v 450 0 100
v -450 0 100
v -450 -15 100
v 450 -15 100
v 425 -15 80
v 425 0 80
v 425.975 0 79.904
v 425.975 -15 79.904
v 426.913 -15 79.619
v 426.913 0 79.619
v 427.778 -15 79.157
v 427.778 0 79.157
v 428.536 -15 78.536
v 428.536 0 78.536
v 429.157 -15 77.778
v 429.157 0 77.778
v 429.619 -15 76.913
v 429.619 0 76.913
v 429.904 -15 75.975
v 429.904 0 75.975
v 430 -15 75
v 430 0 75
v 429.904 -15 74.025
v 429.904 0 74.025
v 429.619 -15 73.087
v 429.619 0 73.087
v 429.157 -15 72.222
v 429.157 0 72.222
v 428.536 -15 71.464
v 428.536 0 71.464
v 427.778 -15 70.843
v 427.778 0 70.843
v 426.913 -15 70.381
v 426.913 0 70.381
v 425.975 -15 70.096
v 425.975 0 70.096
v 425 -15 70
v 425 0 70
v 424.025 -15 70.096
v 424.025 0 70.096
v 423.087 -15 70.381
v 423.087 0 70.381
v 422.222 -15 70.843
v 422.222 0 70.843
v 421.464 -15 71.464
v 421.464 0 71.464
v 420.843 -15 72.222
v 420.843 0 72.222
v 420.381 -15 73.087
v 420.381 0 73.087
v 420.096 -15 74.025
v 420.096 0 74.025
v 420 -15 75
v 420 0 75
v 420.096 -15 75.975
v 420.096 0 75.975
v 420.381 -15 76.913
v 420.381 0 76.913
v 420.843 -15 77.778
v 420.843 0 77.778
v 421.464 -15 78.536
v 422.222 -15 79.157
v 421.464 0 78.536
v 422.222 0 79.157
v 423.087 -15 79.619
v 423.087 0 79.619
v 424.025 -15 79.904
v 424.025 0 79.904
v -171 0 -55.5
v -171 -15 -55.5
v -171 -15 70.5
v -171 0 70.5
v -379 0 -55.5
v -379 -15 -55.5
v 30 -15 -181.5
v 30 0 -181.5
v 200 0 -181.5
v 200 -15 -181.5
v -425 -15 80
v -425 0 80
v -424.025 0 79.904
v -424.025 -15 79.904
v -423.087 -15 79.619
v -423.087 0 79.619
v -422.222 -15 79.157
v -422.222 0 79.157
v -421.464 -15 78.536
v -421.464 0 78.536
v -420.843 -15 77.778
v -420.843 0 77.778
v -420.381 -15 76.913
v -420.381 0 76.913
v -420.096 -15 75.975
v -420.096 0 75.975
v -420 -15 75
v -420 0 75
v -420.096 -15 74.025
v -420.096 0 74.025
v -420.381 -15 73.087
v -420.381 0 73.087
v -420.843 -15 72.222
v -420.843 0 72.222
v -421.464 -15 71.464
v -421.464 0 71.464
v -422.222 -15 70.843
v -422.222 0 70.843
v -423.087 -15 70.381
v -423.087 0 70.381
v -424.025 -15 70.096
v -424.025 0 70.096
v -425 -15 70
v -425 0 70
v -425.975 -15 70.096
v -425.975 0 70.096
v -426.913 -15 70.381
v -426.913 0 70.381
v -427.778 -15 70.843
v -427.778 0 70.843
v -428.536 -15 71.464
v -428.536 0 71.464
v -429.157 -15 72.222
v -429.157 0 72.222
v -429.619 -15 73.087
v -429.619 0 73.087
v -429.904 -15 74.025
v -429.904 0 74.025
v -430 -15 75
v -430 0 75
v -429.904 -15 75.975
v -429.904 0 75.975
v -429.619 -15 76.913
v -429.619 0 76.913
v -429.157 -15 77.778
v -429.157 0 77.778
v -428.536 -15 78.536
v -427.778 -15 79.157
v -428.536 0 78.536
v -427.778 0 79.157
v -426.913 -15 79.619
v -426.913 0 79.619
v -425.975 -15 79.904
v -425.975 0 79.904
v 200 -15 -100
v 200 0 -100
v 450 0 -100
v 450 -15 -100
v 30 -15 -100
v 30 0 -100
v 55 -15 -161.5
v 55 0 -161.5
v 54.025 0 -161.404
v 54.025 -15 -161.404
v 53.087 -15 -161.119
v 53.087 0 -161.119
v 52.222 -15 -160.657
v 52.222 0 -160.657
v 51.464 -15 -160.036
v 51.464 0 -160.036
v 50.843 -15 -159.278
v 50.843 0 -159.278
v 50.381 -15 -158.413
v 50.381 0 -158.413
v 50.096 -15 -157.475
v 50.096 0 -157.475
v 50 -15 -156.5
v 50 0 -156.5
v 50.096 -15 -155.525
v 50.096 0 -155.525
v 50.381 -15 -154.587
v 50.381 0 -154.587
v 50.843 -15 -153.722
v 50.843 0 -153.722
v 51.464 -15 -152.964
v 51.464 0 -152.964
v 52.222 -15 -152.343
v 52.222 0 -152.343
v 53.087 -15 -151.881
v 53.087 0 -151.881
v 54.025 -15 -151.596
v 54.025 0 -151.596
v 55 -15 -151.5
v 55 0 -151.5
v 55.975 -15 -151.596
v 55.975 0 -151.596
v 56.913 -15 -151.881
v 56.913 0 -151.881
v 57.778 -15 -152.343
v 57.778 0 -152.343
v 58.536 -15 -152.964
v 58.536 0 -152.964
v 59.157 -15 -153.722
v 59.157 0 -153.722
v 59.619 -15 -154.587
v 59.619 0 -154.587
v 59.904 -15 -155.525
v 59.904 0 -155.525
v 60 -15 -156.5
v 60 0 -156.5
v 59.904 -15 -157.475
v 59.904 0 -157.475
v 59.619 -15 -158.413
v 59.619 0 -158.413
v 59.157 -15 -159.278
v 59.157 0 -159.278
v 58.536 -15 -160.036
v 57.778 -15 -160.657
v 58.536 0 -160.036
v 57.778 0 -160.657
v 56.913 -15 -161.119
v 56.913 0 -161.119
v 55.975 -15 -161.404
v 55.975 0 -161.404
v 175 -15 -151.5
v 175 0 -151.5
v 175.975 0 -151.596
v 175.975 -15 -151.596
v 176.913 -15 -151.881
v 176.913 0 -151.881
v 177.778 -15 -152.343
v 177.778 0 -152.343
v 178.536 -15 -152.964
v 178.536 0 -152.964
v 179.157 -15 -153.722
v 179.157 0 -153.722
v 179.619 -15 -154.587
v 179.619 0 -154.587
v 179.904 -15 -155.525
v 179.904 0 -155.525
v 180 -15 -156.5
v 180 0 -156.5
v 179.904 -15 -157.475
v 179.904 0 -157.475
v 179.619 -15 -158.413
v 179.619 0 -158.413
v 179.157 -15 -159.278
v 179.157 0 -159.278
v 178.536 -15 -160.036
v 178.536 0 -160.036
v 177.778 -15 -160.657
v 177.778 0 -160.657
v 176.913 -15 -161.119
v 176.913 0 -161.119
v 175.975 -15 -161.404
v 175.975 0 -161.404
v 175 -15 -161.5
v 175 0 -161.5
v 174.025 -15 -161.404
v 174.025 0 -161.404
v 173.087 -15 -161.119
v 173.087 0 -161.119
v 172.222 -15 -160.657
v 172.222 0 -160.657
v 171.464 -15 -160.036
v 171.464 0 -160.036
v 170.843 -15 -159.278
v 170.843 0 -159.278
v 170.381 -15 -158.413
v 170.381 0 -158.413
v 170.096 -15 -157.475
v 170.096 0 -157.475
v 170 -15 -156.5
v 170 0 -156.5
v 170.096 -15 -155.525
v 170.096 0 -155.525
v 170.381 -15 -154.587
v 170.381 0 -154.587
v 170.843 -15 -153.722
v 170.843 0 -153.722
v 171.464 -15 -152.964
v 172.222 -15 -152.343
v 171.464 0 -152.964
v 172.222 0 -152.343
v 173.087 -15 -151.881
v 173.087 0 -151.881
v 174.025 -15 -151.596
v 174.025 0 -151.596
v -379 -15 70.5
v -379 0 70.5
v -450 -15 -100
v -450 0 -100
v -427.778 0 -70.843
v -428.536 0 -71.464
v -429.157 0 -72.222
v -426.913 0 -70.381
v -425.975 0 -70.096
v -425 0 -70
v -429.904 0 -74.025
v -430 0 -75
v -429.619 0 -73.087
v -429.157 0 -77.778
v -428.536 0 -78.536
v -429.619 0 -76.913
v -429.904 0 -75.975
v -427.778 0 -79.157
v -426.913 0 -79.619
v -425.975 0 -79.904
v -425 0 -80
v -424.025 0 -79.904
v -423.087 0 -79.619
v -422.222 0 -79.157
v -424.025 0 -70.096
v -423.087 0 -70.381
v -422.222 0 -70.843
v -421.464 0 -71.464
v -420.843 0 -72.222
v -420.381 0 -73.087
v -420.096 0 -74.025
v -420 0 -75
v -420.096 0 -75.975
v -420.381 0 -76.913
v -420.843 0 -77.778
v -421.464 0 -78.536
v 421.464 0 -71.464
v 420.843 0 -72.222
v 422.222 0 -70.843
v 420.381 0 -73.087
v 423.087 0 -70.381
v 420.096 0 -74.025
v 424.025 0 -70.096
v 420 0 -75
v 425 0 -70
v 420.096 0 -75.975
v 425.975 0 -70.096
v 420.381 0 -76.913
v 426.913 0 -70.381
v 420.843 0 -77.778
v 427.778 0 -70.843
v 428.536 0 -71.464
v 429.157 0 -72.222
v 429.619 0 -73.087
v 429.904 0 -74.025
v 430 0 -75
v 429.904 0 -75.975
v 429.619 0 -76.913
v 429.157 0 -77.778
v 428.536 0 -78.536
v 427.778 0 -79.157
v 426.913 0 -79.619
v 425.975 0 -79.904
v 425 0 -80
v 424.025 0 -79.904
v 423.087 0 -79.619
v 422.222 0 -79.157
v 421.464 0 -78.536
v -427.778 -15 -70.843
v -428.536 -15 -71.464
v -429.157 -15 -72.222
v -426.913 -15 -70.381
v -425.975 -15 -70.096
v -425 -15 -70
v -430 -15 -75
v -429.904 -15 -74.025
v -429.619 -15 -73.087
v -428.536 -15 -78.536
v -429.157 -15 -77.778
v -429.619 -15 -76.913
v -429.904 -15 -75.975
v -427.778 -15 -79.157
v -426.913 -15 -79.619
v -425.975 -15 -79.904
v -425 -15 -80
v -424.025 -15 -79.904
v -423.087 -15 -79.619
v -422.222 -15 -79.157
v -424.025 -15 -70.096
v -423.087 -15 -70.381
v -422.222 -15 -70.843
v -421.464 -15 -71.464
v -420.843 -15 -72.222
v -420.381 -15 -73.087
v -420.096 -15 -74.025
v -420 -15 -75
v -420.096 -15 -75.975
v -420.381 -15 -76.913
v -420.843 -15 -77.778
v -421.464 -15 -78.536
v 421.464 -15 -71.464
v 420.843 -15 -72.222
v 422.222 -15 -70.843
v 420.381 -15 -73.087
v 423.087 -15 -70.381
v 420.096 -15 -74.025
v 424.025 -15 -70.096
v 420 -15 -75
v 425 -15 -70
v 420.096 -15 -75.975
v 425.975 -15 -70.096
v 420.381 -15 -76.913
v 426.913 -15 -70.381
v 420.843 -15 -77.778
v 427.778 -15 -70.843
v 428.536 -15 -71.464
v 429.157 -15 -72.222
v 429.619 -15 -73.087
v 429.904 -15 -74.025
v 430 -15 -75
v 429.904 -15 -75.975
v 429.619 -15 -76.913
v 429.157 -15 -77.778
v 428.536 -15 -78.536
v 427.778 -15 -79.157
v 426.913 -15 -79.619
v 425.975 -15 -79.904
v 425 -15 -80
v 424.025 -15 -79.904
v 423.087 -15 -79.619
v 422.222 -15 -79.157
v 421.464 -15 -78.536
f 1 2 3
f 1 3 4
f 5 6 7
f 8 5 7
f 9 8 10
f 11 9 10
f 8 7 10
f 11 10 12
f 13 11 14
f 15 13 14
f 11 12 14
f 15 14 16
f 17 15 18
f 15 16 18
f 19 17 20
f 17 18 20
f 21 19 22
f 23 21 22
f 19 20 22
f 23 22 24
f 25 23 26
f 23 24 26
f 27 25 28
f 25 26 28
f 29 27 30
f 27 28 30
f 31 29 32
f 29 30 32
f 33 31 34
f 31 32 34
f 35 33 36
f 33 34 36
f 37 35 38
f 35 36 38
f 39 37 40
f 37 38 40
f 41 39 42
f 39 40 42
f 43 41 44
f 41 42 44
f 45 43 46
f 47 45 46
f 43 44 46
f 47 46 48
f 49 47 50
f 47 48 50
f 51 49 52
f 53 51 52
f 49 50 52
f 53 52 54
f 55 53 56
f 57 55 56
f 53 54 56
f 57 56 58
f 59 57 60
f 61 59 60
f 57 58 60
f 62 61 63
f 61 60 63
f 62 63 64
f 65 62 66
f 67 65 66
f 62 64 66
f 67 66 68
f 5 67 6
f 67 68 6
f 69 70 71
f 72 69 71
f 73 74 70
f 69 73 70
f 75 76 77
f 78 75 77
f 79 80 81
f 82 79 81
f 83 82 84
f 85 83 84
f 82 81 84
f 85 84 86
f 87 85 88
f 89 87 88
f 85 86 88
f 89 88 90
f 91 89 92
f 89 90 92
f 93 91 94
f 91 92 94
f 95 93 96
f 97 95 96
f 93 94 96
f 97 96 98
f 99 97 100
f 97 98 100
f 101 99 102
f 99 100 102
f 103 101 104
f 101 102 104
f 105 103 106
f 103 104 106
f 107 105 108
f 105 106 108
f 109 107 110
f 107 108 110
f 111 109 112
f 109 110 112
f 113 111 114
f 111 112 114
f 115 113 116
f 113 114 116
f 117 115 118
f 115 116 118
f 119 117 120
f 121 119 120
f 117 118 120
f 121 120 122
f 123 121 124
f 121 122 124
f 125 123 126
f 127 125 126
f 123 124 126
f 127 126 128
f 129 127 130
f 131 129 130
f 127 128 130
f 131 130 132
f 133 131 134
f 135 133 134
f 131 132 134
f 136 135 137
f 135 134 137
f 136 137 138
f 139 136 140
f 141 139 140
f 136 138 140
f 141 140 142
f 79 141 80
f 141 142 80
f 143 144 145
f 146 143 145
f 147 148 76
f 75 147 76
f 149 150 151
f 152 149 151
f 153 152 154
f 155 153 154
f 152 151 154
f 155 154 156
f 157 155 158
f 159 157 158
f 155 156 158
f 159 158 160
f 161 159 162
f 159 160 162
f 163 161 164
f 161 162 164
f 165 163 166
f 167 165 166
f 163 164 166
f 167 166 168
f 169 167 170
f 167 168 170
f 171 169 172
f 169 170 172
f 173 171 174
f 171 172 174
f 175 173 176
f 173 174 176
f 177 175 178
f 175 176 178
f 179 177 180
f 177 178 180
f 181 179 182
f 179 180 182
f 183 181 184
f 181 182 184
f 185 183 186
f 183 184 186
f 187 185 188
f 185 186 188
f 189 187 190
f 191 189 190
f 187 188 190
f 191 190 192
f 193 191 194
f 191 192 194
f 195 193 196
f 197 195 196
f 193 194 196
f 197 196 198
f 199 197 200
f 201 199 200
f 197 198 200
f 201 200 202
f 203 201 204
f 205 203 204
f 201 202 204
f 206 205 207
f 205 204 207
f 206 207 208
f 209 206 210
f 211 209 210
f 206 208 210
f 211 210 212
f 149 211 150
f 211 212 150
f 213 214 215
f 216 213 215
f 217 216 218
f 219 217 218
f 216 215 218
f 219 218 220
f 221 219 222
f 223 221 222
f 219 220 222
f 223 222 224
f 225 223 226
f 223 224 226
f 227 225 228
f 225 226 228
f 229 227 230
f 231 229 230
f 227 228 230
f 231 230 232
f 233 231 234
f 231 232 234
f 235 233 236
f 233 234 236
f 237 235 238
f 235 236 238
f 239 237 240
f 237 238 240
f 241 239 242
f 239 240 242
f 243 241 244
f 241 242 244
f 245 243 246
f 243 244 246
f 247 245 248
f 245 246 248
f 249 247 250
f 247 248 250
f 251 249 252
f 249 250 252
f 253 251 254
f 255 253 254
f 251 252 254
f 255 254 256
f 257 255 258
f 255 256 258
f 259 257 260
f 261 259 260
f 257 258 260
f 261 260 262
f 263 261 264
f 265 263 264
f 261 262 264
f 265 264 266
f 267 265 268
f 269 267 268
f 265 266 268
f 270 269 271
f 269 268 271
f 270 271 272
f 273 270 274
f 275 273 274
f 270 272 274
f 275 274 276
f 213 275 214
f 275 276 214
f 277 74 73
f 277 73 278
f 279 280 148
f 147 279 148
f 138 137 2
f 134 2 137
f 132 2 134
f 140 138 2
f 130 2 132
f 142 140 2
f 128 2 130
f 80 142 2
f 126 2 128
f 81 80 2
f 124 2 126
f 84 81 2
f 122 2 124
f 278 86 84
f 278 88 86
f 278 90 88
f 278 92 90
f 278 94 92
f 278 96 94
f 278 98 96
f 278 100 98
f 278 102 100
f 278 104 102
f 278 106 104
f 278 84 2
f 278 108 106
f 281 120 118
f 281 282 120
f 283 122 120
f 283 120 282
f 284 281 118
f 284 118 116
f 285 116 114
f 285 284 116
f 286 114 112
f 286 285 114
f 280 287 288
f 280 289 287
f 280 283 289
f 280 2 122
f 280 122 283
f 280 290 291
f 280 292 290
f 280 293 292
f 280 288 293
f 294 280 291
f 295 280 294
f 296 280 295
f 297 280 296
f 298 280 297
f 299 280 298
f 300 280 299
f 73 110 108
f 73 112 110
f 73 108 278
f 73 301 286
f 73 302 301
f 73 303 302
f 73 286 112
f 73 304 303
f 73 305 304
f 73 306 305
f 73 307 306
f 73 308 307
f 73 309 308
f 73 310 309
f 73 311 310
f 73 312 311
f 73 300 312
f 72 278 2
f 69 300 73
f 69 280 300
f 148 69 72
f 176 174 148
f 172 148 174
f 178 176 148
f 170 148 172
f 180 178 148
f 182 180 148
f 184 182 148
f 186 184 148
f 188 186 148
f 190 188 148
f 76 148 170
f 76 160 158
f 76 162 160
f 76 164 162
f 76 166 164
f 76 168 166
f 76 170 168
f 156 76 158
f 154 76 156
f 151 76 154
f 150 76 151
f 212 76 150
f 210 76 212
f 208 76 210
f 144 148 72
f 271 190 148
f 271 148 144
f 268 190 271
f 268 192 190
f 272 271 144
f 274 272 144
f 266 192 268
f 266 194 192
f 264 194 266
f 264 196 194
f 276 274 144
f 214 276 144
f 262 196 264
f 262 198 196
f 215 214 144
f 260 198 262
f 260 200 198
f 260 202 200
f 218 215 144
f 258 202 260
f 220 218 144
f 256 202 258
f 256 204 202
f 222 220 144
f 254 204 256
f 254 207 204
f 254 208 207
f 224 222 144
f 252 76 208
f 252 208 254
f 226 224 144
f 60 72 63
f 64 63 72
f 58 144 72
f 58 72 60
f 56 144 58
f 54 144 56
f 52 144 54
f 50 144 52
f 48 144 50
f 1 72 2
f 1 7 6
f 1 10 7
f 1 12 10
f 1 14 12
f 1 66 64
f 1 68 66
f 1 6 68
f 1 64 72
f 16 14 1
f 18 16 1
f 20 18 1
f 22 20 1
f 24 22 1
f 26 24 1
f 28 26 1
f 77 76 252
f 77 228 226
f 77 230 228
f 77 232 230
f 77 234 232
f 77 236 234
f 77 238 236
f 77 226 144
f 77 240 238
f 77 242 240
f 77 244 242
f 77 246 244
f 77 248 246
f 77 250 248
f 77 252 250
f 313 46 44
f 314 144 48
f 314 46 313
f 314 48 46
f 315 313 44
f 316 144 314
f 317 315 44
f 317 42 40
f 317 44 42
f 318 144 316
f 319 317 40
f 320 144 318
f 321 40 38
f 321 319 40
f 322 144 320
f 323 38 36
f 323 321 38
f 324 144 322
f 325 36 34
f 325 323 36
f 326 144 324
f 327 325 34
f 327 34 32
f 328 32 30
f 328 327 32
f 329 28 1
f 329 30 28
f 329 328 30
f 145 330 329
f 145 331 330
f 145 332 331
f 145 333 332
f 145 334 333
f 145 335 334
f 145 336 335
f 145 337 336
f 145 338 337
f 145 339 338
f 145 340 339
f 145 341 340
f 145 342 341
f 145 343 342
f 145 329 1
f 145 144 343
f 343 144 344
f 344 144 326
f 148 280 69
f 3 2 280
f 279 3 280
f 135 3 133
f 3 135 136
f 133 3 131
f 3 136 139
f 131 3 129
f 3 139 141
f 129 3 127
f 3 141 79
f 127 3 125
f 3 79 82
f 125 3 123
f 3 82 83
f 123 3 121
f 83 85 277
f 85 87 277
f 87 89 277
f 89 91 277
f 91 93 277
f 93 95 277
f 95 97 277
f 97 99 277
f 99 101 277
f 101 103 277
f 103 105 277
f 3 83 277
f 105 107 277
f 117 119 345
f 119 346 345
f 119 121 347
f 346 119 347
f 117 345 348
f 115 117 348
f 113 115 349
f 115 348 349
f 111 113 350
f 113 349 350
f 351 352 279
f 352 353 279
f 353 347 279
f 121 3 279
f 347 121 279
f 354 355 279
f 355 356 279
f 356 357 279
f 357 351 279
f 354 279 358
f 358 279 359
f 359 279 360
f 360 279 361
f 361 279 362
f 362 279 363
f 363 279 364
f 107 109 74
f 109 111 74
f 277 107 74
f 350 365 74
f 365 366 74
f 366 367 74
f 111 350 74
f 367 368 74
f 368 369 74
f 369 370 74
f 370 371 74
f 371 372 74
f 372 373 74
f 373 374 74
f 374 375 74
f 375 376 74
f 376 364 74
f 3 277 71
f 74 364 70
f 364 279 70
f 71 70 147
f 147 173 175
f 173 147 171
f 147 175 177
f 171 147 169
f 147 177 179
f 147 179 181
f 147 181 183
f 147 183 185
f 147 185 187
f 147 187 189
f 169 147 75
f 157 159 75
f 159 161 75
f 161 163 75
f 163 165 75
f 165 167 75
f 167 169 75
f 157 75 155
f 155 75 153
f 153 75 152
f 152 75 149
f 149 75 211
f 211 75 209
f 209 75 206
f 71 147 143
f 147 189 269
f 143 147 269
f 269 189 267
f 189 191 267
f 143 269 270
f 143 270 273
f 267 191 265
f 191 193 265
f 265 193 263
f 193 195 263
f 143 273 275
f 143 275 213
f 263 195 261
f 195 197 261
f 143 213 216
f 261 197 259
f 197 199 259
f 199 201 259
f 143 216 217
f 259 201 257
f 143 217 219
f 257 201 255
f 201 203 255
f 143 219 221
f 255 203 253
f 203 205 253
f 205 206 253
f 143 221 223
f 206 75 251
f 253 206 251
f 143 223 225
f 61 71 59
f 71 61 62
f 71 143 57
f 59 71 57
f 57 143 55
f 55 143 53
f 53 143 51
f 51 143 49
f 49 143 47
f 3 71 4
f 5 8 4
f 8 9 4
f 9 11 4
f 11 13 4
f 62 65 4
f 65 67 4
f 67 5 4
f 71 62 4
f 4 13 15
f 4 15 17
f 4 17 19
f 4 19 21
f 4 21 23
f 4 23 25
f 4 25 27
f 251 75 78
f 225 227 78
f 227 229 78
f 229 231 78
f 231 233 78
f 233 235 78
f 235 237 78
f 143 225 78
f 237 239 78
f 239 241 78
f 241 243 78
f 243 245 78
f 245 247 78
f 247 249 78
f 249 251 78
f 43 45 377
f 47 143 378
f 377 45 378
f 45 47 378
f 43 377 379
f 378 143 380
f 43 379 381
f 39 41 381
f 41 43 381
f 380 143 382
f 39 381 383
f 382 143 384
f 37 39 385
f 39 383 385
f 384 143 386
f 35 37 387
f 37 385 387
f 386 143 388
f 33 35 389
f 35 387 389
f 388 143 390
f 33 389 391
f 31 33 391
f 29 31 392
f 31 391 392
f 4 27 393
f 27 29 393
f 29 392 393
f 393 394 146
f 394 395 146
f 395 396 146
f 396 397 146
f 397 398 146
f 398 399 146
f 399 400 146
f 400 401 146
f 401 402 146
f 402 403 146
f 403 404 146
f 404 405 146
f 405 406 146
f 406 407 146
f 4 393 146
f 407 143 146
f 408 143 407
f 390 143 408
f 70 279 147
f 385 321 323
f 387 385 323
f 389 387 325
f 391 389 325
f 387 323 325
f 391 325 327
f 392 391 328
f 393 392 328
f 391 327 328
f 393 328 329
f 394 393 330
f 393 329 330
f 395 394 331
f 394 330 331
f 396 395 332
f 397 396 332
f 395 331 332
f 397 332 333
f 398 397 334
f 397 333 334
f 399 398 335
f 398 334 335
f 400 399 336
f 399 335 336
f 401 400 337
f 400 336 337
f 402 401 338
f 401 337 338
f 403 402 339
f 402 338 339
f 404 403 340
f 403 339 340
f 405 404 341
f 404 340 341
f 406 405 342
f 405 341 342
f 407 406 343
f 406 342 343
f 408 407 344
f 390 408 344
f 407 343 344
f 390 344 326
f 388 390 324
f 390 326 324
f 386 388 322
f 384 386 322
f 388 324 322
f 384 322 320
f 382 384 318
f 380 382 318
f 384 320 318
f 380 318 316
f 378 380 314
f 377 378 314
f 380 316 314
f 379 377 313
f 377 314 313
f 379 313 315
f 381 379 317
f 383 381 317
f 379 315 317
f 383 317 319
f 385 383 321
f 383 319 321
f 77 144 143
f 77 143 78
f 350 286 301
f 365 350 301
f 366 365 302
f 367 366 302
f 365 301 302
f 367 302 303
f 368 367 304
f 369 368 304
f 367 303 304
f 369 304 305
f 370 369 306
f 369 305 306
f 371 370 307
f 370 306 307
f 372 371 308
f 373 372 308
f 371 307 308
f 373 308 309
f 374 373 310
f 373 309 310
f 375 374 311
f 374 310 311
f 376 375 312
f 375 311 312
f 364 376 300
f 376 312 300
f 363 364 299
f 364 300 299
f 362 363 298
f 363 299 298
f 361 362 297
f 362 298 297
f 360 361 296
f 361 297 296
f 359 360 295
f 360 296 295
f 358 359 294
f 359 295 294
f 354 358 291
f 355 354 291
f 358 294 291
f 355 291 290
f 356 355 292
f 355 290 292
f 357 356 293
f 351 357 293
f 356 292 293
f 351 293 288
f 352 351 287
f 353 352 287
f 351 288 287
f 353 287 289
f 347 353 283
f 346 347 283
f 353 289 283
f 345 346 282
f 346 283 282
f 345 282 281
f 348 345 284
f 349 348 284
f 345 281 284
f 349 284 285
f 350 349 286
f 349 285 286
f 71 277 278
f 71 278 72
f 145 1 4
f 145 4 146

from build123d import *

# Parameters (mm, degrees)
SKETCH1_W              = 900
SKETCH1_H              = 200
SKETCH1_R              = 5
BOSS_EXTRUDE1_DEPTH    = 15
SKETCH2_W              = 208
SKETCH2_H              = 126
SHREDDER_OPENING_DEPTH = 462.221205063
SKETCH3_W              = 170
SKETCH3_H              = 81.5
SKETCH3_R              = 5
LEGS_ADD_ON_DEPTH      = 15


with BuildPart() as part:
    # Sketch1 → Boss-Extrude1 (new body)
    with BuildSketch(Plane(origin=(0, 0, 0), x_dir=(1, 0, 0), z_dir=(0, 1, 0))):
        Rectangle(SKETCH1_W, SKETCH1_H)
        with Locations(Location((425, -75, 0), (0, 0, 270))):
            Circle(SKETCH1_R, mode=Mode.SUBTRACT)
        with Locations(Location((425, 75, 0), (0, 0, 270))):
            Circle(SKETCH1_R, mode=Mode.SUBTRACT)
        with Locations(Location((-425, -75, 0), (0, 0, 270))):
            Circle(SKETCH1_R, mode=Mode.SUBTRACT)
        with Locations(Location((-425, 75, 0), (0, 0, 270))):
            Circle(SKETCH1_R, mode=Mode.SUBTRACT)
    extrude(amount=-BOSS_EXTRUDE1_DEPTH)

    # Sketch2 → Shredder Opening (cut, through all)
    with BuildSketch(Plane.XZ.offset(15)):
        with Locations((-275, 7.5)):
            Rectangle(SKETCH2_W, SKETCH2_H)
    extrude(amount=-SHREDDER_OPENING_DEPTH, mode=Mode.SUBTRACT)

    # Sketch3 → Legs add on (add, through all)
    with BuildSketch(Plane(origin=(0, 0, 0), x_dir=(1, 0, 0), z_dir=(0, 1, 0))):
        with Locations((115, 140.75)):
            Rectangle(SKETCH3_W, SKETCH3_H)
        with Locations(Location((175, 156.5, 0), (0, 0, 270))):
            Circle(SKETCH3_R, mode=Mode.SUBTRACT)
        with Locations(Location((55, 156.5, 0), (0, 0, 90))):
            Circle(SKETCH3_R, mode=Mode.SUBTRACT)
    extrude(amount=-LEGS_ADD_ON_DEPTH)


solid = part.part
